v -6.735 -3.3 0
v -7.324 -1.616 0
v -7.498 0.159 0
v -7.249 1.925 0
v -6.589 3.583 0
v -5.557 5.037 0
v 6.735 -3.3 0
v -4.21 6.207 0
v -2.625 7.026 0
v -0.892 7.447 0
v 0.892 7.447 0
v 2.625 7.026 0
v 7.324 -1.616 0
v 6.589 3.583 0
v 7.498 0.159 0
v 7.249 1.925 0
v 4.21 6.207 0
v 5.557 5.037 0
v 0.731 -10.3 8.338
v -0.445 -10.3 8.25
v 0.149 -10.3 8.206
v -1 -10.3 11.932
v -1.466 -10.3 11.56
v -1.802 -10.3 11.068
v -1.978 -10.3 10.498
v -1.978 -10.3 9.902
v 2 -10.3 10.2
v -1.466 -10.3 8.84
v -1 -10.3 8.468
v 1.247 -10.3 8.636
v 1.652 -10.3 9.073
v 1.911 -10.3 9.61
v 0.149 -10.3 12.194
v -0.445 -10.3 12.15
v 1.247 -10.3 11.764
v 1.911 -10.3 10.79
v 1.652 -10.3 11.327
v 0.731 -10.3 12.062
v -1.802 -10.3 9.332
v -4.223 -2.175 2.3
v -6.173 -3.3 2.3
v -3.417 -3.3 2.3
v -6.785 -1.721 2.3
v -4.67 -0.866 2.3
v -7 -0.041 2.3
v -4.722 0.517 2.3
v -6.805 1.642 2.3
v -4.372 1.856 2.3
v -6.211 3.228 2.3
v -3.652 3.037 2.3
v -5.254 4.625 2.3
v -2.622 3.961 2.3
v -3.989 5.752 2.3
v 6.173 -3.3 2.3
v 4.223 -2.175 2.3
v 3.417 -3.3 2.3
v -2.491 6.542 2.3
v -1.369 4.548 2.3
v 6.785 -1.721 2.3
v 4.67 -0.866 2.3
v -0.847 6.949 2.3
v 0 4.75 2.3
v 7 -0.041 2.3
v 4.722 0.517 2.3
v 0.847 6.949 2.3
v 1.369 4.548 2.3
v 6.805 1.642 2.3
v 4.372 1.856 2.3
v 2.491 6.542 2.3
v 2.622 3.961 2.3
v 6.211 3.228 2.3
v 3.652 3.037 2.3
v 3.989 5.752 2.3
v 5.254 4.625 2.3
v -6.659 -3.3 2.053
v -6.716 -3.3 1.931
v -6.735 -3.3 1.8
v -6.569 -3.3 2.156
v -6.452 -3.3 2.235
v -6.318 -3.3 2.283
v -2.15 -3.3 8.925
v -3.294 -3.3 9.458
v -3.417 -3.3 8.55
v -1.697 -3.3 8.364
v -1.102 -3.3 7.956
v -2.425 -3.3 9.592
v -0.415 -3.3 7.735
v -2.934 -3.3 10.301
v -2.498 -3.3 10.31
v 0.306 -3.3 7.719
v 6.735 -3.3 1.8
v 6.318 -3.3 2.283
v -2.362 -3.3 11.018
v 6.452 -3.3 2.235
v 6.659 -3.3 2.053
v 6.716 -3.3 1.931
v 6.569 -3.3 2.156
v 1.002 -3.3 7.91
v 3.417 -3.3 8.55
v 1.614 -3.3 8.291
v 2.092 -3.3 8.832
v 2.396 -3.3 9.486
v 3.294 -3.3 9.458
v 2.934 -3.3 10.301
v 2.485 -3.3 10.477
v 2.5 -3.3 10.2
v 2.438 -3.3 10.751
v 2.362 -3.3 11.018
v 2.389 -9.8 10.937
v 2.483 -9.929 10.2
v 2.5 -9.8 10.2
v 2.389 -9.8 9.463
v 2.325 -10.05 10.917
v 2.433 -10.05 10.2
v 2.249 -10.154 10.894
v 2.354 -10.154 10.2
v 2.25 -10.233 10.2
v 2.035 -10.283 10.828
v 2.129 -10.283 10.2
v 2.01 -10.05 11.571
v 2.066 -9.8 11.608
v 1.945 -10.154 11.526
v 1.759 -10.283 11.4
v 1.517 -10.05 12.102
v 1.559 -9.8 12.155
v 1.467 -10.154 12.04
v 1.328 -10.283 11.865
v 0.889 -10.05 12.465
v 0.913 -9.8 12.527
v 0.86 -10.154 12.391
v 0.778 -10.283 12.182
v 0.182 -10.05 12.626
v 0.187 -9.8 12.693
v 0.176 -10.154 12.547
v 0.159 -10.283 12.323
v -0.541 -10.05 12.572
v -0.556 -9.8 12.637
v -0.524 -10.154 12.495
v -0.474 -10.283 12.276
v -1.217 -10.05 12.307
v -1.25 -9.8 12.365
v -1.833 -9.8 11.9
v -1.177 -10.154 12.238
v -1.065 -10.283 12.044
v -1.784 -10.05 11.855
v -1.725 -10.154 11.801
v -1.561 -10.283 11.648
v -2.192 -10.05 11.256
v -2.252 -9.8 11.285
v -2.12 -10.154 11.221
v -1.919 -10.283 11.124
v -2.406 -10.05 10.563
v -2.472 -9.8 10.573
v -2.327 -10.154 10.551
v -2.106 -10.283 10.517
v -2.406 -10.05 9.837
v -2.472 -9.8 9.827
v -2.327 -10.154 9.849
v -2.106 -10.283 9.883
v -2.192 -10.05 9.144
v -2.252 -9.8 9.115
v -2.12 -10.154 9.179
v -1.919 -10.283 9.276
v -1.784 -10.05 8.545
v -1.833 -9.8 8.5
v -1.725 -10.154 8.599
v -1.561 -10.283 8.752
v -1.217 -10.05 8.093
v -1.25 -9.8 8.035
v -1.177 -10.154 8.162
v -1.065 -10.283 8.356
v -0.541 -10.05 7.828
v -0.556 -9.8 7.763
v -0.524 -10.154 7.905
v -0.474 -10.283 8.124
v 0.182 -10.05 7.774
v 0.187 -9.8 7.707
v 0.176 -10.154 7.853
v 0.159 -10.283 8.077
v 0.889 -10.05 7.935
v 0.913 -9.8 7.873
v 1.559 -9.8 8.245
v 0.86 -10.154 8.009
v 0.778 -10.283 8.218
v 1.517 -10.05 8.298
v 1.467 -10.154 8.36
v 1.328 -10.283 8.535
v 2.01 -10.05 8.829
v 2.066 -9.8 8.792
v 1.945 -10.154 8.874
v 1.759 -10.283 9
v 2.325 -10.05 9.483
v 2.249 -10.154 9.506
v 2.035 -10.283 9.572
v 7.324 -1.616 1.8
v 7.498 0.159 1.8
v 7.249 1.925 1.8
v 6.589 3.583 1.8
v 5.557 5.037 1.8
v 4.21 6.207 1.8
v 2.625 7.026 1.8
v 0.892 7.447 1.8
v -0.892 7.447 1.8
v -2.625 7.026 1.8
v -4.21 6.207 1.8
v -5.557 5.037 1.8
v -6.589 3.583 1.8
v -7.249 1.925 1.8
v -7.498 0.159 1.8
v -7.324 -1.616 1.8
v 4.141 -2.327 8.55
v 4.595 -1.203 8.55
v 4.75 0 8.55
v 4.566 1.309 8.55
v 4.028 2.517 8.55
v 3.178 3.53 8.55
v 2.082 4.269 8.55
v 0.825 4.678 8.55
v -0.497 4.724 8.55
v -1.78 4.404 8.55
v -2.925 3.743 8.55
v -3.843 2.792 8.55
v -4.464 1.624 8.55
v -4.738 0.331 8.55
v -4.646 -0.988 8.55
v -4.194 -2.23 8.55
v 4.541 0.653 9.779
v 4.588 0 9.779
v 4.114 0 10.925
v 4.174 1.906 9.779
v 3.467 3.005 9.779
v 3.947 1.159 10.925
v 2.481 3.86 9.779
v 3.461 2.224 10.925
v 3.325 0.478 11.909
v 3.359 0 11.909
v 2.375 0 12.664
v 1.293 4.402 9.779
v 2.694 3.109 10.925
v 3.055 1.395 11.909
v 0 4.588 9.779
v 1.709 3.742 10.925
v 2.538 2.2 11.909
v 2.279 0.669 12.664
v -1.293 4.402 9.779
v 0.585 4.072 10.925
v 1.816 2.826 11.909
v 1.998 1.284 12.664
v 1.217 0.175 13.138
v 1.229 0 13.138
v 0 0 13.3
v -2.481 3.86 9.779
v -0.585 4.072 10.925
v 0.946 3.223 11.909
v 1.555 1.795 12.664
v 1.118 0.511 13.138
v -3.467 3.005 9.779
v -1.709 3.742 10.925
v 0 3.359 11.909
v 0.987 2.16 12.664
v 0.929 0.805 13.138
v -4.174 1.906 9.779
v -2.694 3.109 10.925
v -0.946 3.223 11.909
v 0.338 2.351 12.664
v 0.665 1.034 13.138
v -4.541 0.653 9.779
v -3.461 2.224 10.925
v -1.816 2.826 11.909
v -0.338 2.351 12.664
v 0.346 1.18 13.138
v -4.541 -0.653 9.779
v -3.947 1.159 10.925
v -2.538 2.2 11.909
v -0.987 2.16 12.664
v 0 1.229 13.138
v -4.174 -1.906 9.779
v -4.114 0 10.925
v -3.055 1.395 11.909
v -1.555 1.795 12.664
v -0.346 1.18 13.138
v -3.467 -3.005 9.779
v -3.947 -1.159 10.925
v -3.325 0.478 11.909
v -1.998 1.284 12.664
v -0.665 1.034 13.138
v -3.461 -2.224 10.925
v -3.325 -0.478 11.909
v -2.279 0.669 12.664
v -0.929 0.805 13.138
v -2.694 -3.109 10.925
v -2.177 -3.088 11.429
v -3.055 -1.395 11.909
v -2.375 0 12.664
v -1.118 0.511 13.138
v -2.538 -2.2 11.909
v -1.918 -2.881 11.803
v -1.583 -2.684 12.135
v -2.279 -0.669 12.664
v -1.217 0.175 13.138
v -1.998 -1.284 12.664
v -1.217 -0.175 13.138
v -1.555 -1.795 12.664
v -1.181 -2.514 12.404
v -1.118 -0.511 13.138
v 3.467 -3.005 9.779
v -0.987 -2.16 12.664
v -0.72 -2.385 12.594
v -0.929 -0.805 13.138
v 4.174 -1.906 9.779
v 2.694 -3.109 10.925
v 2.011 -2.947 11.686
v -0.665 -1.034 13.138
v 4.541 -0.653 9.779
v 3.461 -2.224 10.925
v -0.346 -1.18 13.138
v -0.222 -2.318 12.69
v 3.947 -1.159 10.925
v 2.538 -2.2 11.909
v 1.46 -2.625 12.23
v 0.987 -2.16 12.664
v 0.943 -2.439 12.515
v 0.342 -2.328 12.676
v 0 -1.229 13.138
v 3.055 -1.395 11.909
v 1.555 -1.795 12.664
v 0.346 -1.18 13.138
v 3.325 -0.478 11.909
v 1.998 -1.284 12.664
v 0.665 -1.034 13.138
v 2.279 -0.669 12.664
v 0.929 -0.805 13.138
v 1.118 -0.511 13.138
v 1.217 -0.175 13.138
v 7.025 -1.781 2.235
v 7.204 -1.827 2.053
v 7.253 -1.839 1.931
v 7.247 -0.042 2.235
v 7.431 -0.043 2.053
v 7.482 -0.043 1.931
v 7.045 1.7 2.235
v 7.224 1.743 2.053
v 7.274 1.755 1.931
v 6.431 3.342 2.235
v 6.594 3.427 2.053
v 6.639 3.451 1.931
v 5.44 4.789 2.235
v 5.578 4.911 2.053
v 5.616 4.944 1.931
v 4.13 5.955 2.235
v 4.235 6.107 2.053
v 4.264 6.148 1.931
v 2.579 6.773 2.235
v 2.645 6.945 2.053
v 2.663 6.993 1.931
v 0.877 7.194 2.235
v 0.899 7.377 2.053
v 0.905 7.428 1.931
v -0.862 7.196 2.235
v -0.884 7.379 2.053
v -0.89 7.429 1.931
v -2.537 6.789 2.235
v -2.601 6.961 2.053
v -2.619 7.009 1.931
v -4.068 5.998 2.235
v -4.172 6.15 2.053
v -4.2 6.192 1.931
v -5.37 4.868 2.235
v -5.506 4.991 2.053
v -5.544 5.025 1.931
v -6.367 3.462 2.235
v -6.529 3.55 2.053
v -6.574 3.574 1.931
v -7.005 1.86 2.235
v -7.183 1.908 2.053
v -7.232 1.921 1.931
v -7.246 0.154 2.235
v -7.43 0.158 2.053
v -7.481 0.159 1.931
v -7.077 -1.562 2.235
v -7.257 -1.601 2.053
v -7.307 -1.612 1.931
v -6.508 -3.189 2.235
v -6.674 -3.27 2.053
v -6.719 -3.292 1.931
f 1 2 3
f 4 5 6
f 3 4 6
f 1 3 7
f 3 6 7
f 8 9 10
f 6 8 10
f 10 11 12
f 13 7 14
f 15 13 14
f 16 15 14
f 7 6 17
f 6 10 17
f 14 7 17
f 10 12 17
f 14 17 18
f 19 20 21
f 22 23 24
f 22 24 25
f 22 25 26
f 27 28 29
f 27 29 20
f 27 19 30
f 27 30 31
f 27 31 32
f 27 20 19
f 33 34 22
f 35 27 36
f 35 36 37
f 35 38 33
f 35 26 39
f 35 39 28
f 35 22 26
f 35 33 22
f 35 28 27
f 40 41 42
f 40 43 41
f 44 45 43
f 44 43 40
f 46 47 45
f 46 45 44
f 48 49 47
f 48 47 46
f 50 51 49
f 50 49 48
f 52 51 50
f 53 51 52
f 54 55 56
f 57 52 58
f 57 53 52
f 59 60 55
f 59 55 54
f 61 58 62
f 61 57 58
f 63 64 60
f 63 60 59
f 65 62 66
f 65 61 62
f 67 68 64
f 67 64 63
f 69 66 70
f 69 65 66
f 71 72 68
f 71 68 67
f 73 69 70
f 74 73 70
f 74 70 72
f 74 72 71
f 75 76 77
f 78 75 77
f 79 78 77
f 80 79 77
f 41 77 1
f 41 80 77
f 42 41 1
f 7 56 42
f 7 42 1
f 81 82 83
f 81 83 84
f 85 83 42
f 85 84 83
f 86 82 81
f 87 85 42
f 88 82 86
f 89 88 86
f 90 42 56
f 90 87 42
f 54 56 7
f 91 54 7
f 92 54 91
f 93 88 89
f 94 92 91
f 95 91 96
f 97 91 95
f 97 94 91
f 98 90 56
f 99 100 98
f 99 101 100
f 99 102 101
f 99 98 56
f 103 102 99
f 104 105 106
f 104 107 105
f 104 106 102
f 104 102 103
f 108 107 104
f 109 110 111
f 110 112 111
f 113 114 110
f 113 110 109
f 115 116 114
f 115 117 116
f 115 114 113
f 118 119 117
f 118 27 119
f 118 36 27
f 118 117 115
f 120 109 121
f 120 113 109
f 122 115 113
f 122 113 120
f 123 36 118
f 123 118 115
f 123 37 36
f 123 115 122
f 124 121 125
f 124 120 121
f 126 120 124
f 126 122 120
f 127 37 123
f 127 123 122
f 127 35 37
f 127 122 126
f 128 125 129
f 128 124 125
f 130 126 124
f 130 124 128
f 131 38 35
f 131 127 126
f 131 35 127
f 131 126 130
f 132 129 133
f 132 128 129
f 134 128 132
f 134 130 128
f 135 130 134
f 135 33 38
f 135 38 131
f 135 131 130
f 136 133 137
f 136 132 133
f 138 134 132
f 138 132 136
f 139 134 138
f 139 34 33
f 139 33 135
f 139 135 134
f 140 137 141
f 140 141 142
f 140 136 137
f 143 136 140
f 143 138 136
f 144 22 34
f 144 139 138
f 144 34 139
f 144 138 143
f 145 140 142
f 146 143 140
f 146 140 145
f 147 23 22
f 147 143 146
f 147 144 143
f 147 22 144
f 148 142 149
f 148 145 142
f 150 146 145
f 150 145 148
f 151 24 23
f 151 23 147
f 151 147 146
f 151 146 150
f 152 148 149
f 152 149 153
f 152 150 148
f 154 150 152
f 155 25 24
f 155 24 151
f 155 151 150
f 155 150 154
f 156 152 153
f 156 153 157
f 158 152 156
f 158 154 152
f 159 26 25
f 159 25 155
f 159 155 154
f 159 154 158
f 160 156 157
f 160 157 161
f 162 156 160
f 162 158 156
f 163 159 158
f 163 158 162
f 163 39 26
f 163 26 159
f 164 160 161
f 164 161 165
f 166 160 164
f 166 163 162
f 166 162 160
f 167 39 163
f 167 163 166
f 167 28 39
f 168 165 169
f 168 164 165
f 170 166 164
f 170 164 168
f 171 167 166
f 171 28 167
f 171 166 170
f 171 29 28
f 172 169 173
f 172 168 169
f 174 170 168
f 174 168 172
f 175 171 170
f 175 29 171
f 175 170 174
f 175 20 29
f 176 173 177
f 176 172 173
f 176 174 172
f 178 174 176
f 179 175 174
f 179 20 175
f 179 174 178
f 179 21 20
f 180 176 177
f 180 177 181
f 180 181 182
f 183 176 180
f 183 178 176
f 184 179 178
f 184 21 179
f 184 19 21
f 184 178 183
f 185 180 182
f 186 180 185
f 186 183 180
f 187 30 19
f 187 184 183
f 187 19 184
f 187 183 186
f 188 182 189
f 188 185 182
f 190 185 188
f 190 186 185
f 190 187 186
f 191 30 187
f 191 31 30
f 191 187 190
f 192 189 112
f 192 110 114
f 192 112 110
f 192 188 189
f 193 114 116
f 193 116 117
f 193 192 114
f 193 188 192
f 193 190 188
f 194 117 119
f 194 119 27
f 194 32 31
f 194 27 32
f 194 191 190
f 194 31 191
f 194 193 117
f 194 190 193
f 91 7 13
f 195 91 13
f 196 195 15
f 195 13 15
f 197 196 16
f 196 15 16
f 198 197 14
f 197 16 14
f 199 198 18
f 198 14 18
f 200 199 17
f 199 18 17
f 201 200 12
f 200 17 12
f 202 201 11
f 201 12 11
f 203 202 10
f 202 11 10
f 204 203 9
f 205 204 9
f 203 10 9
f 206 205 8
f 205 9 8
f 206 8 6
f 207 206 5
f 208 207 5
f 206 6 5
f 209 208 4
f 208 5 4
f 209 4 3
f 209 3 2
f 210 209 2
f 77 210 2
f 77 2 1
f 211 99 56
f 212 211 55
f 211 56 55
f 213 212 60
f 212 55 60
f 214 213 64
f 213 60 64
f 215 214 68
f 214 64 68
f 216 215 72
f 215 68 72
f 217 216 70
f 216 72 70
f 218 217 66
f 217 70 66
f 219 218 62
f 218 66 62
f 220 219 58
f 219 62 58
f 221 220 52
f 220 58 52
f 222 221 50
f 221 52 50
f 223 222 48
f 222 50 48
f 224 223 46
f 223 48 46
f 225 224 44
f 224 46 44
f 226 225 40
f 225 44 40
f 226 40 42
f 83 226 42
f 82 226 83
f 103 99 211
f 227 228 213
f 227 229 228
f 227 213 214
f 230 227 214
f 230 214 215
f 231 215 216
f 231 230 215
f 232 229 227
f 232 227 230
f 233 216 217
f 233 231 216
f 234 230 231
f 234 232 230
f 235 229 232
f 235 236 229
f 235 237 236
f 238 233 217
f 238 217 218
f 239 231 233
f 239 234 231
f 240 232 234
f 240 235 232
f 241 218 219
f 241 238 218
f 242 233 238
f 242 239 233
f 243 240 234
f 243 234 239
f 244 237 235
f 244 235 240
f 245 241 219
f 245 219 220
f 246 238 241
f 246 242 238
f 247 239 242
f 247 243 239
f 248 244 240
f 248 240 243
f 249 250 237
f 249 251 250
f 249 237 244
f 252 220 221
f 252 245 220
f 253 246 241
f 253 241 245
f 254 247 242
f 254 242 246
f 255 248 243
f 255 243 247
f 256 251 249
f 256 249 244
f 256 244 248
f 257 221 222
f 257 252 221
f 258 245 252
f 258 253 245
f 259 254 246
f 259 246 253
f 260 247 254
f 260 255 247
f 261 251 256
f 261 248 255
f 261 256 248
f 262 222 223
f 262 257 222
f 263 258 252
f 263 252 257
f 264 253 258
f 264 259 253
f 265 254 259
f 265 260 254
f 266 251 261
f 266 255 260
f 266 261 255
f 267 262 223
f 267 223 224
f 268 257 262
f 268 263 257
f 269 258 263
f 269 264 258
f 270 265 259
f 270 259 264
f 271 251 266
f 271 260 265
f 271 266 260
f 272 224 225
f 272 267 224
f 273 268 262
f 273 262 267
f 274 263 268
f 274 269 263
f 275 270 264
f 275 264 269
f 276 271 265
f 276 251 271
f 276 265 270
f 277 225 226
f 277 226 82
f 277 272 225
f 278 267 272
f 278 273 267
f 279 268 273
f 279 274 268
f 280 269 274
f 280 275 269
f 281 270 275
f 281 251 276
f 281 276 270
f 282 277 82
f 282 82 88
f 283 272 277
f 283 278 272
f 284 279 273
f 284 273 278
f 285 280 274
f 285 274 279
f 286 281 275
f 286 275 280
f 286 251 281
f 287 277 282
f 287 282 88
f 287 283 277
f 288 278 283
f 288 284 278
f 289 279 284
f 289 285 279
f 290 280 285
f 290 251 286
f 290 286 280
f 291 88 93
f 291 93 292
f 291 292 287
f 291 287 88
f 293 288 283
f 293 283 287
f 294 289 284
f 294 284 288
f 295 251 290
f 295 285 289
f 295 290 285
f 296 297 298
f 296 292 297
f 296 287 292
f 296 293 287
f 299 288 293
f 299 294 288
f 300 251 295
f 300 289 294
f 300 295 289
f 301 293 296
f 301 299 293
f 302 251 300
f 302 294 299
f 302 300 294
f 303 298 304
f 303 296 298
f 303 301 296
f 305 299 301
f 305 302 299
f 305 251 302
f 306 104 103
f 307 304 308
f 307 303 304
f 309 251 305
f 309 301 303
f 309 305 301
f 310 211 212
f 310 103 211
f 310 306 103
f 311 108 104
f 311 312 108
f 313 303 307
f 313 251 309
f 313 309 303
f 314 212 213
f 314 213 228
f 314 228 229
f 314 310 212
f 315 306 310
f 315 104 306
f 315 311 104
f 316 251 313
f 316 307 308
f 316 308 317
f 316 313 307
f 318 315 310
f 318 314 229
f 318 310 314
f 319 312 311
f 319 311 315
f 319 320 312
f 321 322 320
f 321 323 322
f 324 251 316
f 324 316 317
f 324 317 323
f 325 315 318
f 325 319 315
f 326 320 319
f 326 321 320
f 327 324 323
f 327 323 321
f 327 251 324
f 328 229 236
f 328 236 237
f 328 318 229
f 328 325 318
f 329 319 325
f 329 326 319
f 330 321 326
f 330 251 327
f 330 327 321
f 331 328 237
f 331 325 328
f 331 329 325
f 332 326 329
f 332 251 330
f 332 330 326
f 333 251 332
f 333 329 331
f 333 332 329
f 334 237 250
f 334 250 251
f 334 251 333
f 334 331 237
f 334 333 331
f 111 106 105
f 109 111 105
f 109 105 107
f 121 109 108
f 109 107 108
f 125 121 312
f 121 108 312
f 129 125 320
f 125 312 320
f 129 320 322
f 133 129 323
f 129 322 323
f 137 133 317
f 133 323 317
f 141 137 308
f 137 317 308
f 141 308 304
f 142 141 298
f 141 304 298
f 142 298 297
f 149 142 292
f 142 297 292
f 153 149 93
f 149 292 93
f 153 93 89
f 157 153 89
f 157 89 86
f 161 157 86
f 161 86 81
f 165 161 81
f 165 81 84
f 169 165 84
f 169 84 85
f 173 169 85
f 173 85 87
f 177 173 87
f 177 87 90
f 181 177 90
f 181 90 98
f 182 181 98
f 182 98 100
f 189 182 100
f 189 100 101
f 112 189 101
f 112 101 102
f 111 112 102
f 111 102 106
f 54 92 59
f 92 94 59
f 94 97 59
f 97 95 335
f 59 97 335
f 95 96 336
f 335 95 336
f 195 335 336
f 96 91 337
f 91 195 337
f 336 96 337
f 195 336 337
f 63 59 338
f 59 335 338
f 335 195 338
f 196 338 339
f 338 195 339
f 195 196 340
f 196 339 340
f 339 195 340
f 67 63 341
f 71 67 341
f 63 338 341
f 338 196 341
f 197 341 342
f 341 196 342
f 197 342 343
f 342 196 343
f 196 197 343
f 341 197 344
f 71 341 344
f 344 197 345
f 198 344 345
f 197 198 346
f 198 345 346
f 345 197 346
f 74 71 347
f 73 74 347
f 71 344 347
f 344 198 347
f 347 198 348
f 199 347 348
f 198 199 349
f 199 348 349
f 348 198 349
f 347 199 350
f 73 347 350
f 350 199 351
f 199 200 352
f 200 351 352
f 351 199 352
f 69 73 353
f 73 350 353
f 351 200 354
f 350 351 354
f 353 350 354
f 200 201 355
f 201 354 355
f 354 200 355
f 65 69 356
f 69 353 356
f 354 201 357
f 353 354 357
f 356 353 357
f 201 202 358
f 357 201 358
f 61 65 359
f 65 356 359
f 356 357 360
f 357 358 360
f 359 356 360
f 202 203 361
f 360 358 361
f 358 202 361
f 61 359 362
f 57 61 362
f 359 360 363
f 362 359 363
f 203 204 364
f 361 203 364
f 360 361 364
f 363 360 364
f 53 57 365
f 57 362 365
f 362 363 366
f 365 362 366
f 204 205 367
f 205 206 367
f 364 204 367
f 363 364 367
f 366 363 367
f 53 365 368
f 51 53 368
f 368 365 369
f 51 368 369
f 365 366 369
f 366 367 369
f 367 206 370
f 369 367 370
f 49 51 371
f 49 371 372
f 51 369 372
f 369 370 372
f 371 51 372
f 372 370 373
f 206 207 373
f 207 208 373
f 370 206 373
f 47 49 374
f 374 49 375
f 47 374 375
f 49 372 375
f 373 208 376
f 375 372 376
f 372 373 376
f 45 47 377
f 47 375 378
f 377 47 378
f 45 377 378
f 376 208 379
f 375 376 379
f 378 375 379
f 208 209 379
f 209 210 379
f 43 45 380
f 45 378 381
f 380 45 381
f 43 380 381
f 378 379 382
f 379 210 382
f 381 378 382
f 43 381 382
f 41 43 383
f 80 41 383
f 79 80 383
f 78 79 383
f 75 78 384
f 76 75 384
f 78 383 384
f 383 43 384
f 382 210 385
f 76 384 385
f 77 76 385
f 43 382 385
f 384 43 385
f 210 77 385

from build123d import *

# Parameters (mm, degrees)
F0_R          = 7.5
F1_DEPTH      = 2.3
F2_R          = 4.75
F3_DEPTH      = 11
F4_R          = 4.75
F6_START      = 3.3
F5_W          = 25.7861725986
F5_H          = 21.5545939282
F6_DEPTH      = 4.201
F7_R          = 2.5
F8_DEPTH      = 7
F8_DEPTH_BACK = 2
F9_R          = 0.5
F10_R         = 0.5


with BuildPart() as f1:
    # F0 (on Top) → F1 (new body)
    with BuildSketch(Plane.XY):
        Circle(F0_R)
    extrude(amount=F1_DEPTH)

    # F2 (on face) → F3 (join)
    with BuildSketch(Plane.XY.offset(2.3)):
        Circle(F2_R)
    extrude(amount=F3_DEPTH)

    # F4
    f4_edges = [f1.edges().sort_by_distance(p)[0] for p in [
        (-4.75, 0, 13.3),
    ]]
    fillet(f4_edges, radius=F4_R)

    # F5 (on Front) → F6 (cut)
    with BuildSketch(Plane.XZ.offset(F6_START)):
        with Locations((0.3588497639, 6.3574551605)):
            Rectangle(F5_W, F5_H)
    extrude(amount=F6_DEPTH, mode=Mode.SUBTRACT)

    # F7 (on face) → F8 (join, two sides)
    with BuildSketch(Plane.XZ.offset(3.3)) as f8_sk:
        with Locations((0, 10.2)):
            Circle(F7_R)
    extrude(amount=F8_DEPTH)
    extrude(f8_sk.sketch, amount=-F8_DEPTH_BACK)

    # F9
    f9_edges = [f1.edges().sort_by_distance(p)[0] for p in [
        (0, 7.5, 2.3),
    ]]
    fillet(f9_edges, radius=F9_R)

    # F10
    f10_edges = [f1.edges().sort_by_distance(p)[0] for p in [
        (-2.5, -10.3, 10.2),
    ]]
    fillet(f10_edges, radius=F10_R)


solid = f1.part
